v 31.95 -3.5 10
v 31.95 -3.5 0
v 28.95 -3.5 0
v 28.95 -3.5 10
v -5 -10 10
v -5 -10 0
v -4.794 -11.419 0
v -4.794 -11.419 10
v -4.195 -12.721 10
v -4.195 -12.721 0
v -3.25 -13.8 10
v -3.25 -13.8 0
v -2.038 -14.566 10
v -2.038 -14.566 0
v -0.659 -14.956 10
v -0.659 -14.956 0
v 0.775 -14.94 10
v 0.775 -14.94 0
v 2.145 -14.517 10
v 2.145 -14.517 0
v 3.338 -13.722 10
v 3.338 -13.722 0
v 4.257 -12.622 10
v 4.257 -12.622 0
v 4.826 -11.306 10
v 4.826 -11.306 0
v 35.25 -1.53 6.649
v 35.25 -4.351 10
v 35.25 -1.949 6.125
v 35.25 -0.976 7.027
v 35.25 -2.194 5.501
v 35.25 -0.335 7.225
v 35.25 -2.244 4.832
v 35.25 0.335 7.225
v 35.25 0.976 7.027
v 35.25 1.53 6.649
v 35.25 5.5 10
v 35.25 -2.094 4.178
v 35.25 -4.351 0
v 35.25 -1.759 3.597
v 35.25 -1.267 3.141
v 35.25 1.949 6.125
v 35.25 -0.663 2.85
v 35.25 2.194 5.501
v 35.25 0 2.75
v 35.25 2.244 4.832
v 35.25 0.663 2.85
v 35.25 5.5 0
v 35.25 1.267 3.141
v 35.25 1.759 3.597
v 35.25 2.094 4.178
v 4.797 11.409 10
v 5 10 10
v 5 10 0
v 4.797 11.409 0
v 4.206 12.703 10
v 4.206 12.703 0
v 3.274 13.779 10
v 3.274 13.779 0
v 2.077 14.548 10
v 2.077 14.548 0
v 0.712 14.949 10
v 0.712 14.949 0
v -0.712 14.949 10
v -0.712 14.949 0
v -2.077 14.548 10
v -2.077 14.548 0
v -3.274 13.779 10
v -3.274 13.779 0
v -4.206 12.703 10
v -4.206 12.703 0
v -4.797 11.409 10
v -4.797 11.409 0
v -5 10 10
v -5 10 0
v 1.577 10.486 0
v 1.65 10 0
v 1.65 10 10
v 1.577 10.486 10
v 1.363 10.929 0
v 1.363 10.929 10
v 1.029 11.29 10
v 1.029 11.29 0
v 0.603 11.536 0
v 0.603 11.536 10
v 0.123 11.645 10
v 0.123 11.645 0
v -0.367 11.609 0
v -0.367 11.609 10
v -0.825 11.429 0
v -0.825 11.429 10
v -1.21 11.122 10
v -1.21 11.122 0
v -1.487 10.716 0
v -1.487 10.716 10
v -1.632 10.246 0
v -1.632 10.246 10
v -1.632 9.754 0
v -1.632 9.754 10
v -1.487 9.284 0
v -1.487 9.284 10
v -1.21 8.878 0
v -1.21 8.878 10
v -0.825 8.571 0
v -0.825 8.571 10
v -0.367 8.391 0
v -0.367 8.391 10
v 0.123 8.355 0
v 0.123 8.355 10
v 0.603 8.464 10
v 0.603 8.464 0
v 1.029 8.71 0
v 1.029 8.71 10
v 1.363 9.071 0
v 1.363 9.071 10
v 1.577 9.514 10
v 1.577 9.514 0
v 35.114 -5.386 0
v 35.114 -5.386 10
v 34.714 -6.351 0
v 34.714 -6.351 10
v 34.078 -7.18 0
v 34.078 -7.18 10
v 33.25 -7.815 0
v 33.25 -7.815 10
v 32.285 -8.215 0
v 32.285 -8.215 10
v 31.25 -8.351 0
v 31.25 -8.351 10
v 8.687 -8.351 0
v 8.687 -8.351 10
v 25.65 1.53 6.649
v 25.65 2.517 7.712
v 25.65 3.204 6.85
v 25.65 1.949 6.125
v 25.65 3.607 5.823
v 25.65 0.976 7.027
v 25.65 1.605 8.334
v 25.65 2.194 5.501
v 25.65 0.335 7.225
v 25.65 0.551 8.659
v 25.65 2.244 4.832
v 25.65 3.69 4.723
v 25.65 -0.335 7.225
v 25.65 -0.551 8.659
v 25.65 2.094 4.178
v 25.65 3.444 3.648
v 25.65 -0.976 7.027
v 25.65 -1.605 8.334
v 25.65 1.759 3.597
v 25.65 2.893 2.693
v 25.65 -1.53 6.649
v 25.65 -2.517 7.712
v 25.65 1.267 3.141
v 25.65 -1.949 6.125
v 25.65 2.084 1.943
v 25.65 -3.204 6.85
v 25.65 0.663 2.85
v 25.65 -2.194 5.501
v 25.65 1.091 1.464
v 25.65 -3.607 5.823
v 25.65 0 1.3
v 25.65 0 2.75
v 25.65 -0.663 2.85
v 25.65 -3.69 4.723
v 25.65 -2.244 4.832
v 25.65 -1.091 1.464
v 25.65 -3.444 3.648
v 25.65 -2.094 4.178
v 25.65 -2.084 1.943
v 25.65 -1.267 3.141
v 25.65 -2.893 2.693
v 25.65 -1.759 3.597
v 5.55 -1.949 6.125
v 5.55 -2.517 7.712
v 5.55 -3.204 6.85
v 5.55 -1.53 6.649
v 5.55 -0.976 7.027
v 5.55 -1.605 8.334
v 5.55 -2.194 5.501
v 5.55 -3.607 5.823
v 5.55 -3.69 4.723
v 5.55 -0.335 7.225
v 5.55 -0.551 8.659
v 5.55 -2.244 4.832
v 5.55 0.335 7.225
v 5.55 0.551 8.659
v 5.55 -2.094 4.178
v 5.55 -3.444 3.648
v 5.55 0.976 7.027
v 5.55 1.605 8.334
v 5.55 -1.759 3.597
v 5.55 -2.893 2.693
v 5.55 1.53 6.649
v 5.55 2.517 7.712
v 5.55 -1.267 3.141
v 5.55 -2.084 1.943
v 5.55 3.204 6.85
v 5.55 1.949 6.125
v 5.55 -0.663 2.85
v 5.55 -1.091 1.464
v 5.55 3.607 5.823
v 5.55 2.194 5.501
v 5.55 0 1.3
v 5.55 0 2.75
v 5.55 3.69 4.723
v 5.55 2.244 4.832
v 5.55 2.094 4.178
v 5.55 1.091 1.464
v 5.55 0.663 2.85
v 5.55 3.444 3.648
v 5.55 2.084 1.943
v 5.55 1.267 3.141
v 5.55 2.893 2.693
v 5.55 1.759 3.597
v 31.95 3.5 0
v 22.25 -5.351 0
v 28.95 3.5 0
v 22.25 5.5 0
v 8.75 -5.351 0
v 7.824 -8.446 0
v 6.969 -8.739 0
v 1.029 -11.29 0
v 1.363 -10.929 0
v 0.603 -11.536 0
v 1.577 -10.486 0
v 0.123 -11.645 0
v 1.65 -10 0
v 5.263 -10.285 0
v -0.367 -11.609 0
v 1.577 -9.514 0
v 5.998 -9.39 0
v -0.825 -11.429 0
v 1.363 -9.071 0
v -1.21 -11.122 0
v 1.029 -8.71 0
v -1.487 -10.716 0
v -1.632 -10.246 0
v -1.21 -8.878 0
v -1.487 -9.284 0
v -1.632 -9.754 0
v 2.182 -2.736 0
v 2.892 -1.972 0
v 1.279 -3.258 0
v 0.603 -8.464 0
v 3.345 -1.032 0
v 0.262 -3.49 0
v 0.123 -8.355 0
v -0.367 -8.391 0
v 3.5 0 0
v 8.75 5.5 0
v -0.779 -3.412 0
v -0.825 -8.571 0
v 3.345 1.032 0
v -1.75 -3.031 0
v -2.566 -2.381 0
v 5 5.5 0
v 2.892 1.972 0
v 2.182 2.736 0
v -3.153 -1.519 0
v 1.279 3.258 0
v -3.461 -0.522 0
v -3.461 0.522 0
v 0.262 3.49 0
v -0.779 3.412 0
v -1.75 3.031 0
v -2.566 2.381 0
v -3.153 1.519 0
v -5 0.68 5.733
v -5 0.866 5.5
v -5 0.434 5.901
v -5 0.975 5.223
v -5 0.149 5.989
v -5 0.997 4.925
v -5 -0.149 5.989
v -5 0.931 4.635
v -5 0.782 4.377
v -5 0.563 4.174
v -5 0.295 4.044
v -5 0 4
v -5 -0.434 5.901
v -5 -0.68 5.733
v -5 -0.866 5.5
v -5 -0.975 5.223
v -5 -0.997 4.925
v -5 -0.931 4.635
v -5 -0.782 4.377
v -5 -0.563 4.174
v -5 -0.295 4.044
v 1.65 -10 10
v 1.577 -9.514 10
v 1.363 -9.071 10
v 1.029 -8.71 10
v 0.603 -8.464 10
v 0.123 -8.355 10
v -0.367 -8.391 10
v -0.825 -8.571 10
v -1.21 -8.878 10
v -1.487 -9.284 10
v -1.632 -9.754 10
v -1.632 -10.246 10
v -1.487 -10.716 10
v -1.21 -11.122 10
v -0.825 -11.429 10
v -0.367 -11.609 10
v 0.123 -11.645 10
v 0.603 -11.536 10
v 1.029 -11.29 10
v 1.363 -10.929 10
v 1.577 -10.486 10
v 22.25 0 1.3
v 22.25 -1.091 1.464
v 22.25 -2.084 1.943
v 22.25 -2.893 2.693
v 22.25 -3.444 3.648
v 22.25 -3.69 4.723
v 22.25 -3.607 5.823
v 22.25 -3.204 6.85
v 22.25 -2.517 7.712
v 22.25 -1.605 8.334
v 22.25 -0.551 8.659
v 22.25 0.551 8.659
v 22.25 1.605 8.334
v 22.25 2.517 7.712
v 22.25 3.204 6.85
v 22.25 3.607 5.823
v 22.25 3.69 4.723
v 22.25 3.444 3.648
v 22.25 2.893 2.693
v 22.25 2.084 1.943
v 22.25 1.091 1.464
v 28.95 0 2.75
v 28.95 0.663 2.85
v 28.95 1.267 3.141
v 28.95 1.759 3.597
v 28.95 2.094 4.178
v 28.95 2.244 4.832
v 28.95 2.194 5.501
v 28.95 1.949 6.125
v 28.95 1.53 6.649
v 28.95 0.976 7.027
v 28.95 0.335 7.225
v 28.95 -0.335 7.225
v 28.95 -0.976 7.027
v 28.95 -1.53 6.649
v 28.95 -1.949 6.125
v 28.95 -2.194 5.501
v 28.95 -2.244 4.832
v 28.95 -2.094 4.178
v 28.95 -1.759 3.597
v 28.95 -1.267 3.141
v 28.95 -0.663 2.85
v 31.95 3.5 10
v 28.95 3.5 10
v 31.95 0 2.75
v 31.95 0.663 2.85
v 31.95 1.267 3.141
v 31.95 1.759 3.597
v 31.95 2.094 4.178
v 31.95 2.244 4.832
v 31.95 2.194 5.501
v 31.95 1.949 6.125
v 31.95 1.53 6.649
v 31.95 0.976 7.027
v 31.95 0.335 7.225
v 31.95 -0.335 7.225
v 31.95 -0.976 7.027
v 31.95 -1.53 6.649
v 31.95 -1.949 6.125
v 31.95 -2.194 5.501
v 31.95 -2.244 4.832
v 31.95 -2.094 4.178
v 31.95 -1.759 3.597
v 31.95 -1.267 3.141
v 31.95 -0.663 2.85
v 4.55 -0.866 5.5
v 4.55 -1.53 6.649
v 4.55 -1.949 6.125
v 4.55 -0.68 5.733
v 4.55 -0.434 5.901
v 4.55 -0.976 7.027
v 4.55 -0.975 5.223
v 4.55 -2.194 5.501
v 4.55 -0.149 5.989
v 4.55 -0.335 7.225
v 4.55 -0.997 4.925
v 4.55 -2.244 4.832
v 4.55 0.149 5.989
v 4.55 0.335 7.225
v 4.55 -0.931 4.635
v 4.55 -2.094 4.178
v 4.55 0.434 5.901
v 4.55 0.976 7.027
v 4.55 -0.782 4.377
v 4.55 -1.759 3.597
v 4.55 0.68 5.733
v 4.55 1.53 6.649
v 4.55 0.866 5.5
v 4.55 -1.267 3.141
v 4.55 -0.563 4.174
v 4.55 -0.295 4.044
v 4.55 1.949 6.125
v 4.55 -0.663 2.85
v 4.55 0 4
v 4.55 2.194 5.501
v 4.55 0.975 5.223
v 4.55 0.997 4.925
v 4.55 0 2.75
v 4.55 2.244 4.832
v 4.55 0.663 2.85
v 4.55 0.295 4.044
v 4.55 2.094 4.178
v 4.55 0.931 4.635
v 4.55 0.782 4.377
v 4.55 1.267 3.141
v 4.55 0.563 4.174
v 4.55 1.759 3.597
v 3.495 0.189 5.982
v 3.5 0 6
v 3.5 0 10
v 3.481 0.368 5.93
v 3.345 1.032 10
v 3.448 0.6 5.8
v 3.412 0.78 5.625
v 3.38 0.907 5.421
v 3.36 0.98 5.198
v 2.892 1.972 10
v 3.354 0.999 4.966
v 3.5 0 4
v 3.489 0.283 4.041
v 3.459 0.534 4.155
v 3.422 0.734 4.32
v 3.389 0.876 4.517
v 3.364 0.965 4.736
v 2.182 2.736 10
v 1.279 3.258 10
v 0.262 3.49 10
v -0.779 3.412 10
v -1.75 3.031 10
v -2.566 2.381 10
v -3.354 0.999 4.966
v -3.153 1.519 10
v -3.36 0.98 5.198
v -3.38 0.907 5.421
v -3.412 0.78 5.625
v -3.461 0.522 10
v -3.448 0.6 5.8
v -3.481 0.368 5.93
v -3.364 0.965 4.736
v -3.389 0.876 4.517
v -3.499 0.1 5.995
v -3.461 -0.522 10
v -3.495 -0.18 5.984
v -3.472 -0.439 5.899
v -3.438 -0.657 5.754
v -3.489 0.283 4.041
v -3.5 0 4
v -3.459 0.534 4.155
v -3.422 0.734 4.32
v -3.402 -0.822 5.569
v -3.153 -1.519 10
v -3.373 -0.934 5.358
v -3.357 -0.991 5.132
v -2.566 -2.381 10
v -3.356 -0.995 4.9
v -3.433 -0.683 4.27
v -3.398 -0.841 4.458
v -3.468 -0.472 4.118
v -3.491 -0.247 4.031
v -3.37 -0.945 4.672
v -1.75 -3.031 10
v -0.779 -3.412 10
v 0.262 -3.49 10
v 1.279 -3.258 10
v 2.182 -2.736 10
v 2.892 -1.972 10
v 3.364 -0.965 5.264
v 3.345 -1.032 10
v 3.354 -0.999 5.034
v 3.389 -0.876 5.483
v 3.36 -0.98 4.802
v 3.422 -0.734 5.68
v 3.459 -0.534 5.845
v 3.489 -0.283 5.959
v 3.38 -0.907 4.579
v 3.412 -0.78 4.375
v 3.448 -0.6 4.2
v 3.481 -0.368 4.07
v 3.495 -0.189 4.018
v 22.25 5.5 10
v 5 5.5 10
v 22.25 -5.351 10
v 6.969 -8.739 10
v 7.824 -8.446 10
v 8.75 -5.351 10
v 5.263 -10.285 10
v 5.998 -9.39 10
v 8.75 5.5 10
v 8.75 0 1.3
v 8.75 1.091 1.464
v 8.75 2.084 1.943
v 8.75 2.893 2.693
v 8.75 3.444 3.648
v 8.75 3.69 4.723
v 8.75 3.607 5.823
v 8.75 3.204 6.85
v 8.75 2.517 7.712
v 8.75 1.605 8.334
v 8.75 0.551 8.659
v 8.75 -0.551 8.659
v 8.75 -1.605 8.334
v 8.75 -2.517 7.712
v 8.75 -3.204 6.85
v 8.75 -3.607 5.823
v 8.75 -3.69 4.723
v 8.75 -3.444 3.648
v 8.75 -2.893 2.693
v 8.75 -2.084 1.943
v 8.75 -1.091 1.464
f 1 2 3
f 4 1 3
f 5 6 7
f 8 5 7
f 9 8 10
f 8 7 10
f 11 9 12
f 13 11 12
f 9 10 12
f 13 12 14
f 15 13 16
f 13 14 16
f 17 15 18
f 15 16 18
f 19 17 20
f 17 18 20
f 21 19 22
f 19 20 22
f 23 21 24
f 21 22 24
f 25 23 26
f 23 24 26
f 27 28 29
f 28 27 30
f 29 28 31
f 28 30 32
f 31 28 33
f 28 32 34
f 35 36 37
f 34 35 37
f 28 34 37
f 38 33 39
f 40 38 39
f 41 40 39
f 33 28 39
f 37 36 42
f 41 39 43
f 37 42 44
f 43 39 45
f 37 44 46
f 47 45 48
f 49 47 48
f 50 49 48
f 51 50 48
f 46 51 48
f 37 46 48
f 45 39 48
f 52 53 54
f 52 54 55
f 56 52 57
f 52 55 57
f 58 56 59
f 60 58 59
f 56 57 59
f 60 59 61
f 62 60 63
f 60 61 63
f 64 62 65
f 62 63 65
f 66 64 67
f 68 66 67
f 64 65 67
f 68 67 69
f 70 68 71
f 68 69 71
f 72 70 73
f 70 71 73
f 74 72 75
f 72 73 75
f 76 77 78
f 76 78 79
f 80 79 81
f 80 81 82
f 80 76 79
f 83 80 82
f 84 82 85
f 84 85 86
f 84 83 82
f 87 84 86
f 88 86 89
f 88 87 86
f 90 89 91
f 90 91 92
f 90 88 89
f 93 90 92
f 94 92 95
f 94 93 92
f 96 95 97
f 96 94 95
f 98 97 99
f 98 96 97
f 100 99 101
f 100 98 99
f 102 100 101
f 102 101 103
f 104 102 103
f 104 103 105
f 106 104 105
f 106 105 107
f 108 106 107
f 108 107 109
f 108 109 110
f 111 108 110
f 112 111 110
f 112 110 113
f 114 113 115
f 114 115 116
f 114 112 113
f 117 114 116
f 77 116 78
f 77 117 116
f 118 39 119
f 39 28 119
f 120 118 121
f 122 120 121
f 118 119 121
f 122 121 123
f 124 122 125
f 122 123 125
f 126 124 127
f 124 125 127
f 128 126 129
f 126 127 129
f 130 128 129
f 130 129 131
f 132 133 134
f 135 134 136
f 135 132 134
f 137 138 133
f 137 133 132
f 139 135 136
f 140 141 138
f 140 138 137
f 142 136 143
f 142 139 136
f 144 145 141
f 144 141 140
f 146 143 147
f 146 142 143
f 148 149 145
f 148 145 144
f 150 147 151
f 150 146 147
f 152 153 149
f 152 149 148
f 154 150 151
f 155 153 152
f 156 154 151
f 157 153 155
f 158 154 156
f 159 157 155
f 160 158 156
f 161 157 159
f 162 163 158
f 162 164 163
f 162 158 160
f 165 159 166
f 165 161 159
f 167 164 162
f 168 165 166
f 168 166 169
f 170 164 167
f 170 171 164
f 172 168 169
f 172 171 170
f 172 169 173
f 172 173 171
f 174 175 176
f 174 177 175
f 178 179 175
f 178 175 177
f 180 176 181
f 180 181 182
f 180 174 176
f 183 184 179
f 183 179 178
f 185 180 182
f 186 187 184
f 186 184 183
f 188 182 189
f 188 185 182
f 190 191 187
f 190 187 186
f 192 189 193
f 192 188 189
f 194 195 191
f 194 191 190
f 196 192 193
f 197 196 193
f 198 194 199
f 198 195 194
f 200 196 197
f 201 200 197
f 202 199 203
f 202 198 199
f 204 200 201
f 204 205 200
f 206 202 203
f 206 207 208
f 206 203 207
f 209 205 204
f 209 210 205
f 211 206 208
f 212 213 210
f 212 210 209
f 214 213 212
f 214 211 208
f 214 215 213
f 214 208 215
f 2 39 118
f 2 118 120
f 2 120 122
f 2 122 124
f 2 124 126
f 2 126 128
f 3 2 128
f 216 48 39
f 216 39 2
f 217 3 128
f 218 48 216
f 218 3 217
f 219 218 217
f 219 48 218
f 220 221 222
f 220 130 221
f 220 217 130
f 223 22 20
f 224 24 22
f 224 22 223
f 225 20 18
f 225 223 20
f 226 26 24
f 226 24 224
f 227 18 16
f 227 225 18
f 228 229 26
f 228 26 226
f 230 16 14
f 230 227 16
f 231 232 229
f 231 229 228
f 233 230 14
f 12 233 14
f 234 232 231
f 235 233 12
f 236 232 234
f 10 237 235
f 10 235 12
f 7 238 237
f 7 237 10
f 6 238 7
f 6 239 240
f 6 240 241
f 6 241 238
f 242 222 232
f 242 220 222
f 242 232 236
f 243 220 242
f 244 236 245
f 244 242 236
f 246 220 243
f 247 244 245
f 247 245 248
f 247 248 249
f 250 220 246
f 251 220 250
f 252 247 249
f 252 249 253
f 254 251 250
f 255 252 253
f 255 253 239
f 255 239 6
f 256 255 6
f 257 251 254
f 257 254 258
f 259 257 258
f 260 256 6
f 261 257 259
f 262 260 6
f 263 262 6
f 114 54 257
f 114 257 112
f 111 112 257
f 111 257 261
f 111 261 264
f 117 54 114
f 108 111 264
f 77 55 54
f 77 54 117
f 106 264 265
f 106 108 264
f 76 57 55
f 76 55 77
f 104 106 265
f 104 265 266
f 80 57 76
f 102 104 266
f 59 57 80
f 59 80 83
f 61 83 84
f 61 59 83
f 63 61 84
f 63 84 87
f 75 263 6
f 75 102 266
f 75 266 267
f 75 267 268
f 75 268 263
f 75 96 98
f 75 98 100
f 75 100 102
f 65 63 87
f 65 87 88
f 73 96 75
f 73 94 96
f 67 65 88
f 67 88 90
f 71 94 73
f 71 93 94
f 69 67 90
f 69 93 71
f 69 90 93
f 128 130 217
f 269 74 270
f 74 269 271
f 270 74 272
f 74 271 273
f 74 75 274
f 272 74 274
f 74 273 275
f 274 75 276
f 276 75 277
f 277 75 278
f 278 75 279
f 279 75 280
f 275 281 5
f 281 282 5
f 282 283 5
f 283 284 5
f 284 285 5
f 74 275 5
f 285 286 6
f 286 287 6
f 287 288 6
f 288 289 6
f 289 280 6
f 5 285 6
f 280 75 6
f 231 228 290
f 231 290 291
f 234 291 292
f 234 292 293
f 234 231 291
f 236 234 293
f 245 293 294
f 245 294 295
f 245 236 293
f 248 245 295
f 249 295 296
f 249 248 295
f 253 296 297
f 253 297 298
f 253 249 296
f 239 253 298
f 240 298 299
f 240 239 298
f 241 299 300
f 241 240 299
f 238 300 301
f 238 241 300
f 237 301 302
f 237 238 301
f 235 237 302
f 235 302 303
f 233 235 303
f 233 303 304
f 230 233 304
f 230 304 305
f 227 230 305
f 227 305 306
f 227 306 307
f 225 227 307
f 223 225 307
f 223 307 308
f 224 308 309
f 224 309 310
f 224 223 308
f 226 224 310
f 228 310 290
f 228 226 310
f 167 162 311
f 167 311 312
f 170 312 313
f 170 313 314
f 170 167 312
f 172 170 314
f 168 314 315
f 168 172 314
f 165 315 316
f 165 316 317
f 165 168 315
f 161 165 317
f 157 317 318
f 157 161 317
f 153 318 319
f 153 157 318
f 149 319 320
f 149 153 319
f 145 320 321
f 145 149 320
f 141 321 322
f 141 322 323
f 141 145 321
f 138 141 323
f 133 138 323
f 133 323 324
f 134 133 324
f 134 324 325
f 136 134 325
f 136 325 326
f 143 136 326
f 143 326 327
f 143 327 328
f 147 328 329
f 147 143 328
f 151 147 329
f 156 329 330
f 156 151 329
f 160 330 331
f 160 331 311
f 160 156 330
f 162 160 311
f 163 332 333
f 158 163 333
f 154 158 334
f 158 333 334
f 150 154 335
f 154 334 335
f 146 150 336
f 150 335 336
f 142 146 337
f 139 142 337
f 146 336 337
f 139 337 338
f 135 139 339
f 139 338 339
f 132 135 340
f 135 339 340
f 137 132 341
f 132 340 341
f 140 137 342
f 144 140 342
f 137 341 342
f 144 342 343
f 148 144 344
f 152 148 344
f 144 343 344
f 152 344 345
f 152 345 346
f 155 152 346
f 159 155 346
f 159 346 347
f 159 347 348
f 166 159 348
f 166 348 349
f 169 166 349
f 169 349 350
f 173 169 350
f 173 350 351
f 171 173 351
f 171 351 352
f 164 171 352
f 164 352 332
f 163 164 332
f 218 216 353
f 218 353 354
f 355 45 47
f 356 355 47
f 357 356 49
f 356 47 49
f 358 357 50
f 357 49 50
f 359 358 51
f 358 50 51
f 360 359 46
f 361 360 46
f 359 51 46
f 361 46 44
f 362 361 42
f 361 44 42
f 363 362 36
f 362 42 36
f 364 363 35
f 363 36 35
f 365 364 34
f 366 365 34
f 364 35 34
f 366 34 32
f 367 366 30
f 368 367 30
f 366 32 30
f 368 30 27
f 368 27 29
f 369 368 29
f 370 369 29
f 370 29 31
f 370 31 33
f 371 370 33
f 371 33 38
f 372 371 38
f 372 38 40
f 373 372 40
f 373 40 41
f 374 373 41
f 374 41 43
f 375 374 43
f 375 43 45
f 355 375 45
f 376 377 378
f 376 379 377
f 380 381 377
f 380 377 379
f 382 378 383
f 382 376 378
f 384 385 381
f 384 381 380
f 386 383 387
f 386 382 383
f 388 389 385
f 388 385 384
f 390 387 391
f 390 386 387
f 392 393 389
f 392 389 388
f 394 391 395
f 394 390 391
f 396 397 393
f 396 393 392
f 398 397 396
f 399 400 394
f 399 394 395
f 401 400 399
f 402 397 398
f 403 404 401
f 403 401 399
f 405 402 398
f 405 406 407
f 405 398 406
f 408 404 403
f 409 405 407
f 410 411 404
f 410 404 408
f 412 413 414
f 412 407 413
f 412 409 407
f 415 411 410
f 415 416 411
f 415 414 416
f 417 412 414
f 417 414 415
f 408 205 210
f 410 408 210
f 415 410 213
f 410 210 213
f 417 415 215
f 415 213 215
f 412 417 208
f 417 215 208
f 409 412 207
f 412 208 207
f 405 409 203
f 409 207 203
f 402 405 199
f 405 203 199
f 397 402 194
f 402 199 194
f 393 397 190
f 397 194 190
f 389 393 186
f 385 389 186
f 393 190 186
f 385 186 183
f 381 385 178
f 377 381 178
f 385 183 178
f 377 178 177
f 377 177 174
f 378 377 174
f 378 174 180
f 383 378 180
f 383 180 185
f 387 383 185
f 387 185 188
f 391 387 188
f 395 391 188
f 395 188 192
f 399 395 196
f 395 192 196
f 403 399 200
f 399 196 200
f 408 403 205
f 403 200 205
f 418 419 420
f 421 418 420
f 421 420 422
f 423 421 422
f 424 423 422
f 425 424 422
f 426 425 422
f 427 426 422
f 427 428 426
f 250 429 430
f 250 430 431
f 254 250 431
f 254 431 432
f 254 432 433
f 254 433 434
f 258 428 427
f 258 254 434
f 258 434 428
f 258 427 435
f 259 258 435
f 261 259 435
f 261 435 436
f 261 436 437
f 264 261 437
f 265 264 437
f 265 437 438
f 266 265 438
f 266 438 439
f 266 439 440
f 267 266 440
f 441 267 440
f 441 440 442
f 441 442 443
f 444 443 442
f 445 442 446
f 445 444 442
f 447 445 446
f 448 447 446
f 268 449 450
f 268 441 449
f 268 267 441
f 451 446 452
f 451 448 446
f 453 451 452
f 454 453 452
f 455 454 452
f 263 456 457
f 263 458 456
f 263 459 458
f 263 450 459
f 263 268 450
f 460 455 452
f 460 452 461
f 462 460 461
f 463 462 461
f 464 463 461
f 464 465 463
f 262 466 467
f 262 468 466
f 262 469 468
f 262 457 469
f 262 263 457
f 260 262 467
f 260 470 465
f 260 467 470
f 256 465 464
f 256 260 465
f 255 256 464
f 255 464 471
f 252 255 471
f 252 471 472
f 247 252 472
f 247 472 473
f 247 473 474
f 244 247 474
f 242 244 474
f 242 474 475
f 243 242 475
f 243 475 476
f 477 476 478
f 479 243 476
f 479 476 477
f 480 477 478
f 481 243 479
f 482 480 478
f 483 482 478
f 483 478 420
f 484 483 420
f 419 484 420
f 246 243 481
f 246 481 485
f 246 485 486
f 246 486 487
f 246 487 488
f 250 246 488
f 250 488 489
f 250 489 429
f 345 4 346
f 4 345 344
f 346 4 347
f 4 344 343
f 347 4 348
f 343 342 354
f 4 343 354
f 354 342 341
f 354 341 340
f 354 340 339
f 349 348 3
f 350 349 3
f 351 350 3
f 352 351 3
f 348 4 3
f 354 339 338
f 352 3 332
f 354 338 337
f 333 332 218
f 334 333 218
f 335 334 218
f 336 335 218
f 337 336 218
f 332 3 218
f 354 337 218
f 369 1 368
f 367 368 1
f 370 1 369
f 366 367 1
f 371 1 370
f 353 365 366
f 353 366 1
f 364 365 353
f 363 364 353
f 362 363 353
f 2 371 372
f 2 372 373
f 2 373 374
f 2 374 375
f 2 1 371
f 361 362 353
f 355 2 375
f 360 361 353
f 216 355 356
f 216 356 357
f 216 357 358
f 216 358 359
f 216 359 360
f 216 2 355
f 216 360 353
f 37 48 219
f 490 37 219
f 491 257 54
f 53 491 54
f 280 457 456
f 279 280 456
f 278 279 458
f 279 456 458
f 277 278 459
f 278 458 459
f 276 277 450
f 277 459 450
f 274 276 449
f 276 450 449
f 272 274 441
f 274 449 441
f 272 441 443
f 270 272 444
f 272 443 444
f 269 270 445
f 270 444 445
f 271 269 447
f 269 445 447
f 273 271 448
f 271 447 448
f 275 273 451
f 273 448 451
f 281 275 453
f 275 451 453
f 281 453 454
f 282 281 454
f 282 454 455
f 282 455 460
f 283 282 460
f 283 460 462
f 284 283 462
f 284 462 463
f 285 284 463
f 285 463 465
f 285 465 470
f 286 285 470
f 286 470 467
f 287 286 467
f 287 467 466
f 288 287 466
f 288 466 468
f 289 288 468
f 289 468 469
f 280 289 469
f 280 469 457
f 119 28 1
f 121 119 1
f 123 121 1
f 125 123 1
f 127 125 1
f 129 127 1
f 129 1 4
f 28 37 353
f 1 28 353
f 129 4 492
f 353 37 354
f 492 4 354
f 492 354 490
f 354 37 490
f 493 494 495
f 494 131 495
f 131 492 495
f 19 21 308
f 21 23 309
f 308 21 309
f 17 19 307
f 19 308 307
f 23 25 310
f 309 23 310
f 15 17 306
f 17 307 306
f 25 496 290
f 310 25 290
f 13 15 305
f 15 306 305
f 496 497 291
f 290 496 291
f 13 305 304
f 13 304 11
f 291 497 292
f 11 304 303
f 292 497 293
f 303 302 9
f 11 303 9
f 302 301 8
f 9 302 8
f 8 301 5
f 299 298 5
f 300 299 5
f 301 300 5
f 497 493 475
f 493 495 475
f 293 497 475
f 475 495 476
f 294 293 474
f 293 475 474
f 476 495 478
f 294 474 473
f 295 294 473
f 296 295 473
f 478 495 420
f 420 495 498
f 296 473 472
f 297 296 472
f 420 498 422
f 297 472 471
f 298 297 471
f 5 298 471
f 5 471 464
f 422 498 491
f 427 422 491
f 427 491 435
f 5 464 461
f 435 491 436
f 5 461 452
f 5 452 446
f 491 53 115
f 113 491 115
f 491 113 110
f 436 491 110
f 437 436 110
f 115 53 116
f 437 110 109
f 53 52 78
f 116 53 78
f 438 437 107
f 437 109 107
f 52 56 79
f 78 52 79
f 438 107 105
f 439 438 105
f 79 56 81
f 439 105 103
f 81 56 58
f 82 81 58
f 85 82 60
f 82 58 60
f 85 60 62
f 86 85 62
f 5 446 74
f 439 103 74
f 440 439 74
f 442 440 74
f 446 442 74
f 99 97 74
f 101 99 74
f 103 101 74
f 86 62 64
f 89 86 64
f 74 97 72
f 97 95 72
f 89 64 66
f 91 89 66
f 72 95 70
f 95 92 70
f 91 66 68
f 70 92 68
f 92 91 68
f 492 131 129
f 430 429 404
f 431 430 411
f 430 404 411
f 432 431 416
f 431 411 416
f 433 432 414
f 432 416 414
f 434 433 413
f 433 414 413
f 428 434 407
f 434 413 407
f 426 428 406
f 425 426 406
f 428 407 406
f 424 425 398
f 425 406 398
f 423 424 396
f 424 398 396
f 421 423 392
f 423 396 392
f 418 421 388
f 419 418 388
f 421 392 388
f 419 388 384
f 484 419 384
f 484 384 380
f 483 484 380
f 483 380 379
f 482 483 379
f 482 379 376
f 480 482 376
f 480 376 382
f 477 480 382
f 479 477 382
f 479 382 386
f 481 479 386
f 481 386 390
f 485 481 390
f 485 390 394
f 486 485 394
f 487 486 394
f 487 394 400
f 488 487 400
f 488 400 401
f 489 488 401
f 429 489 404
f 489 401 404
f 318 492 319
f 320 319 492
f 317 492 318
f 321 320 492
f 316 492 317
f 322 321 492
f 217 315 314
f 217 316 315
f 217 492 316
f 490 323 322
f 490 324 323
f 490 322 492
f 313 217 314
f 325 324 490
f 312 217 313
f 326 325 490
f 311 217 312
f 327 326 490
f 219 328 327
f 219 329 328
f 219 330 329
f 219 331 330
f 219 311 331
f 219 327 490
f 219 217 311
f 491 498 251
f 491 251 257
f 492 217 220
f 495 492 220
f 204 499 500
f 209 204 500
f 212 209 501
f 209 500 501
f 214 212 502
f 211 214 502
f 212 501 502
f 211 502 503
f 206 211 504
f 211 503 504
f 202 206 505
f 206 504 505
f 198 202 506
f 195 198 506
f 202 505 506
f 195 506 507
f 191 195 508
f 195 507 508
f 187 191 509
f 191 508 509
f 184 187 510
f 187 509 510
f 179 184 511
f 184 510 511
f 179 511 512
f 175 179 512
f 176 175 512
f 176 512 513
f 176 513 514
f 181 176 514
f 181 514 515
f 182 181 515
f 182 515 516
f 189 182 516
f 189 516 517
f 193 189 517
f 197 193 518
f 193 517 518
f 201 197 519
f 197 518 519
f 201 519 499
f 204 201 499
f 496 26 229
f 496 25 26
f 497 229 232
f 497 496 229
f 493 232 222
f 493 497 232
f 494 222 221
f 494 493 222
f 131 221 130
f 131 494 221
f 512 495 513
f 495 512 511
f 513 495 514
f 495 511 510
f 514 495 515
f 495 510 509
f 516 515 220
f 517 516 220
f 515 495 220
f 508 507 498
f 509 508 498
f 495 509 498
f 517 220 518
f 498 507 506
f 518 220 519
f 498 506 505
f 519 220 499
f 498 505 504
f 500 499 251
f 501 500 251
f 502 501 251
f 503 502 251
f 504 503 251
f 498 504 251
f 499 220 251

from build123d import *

# Parameters (mm, degrees)
ESQUISSE1_R          = 1.65
ESQUISSE1_R_2        = 3.5
SHAPE_DEPTH          = 10
ESQUISSE6_W          = 10
ESQUISSE6_H          = 15
MAINSHAPE_DEPTH      = 30.25
ESQUISSE10_W         = 13.5
ESQUISSE10_H         = 12.85118471
SPACEREMOVER_DEPTH   = 13
ESQUISSE11_R         = 2.25
AXE_DEPTH            = 16
ESQUISSE12_R         = 3.7
BEARINGBOTTOM_DEPTH  = 3.2
BEARINGTOP_START     = -3.4
ESQUISSE14_R         = 3.7
BEARINGTOP_DEPTH     = 3.4
ESQUISSE15_R         = 2.25
AXEEND_DEPTH         = 1
ESQUISSE16_W         = 3
ESQUISSE16_H         = 7
AXELOCKER_DEPTH      = 10
ESQUISSE17_W         = 30.25
ESQUISSE17_H         = 0.85118471
RENFORCMENT_DEPTH    = 10
ESQUISSE18_W         = 30.25
ESQUISSE18_H         = 2
MASSREMOVER_DEPTH    = 10
CONG_1_R             = 4
ESQUISSE19_R         = 1
REMOVER_HELPER_DEPTH = 10


with BuildPart() as part:
    # Esquisse1 → Shape (new body)
    with BuildSketch(Plane.XY):
        with BuildLine():
            ThreePointArc((5, 10), (0, 15), (-5, 10))
            Line((-5, 10), (-5, -10))
            ThreePointArc((-5, -10), (0, -15), (5, -10))
            Line((5, -10), (5, 10))
        make_face()
        with Locations((0, 10)):
            Circle(ESQUISSE1_R, mode=Mode.SUBTRACT)
        Circle(ESQUISSE1_R_2, mode=Mode.SUBTRACT)
        with Locations((0, -10)):
            Circle(ESQUISSE1_R, mode=Mode.SUBTRACT)
    extrude(amount=SHAPE_DEPTH)

    # Esquisse6 → MainShape (add)
    with BuildSketch(Plane(origin=(5, 0, 0), x_dir=(0, 0, -1), z_dir=(1, 0, 0))):
        with Locations((-5, 0)):
            Rectangle(ESQUISSE6_W, ESQUISSE6_H)
    extrude(amount=MAINSHAPE_DEPTH)

    # Esquisse10 → SpaceRemover (cut)
    with BuildSketch(Plane(origin=(0, 0, 0), x_dir=(-1, 0, 0), z_dir=(0, 0, -1))):
        with Locations((-15.5, 1.074407645)):
            Rectangle(ESQUISSE10_W, ESQUISSE10_H)
    extrude(amount=-SPACEREMOVER_DEPTH, mode=Mode.SUBTRACT)

    # Esquisse11 → Axe (cut)
    with BuildSketch(Plane(origin=(35.25, 0, 0), x_dir=(0, 0, -1), z_dir=(1, 0, 0))):
        with Locations((-5, 0)):
            Circle(ESQUISSE11_R)
    extrude(amount=-AXE_DEPTH, mode=Mode.SUBTRACT)

    # Esquisse12 → BearingBottom (cut)
    with BuildSketch(Plane(origin=(8.75, 0, 0), x_dir=(0, 0, -1), z_dir=(1, 0, 0))):
        with Locations((-5, 0)):
            Circle(ESQUISSE12_R)
    extrude(amount=-BEARINGBOTTOM_DEPTH, mode=Mode.SUBTRACT)

    # Esquisse14 → BearingTop (cut)
    with BuildSketch(Plane.ZY.offset(-22.25).offset(BEARINGTOP_START)):
        with Locations(Location((5, 0, 0), (0, 0, 180))):
            Circle(ESQUISSE14_R)
    extrude(amount=BEARINGTOP_DEPTH, mode=Mode.SUBTRACT)

    # Esquisse15 → AxeEnd (cut)
    with BuildSketch(Plane(origin=(5.55, 0, 0), x_dir=(0, 0, -1), z_dir=(1, 0, 0))):
        with Locations((-5, 0)):
            Circle(ESQUISSE15_R)
    extrude(amount=-AXEEND_DEPTH, mode=Mode.SUBTRACT)

    # Esquisse16 → AxeLocker (cut)
    with BuildSketch(Plane(origin=(0, 0, 0), x_dir=(-1, 0, 0), z_dir=(0, 0, -1))):
        with Locations((-30.45, 0)):
            Rectangle(ESQUISSE16_W, ESQUISSE16_H)
    extrude(amount=-AXELOCKER_DEPTH, mode=Mode.SUBTRACT)

    # Esquisse17 → Renforcment (add)
    with BuildSketch(Plane(origin=(0, 0, 0), x_dir=(-1, 0, 0), z_dir=(0, 0, -1))):
        with Locations((-20.125, -7.925592355)):
            Rectangle(ESQUISSE17_W, ESQUISSE17_H)
    extrude(amount=-RENFORCMENT_DEPTH)

    # Esquisse18 → MassRemover (cut)
    with BuildSketch(Plane(origin=(0, 0, 0), x_dir=(-1, 0, 0), z_dir=(0, 0, -1))):
        with Locations((-20.125, 6.5)):
            Rectangle(ESQUISSE18_W, ESQUISSE18_H)
    extrude(amount=-MASSREMOVER_DEPTH, mode=Mode.SUBTRACT)

    # Congé1
    cong_1_edges = [part.edges().sort_by_distance(p)[0] for p in [
        (35.25, -8.35118471, 5),
        (5, -8.35118471, 5),
    ]]
    fillet(cong_1_edges, radius=CONG_1_R)

    # Esquisse19 → Remover helper (cut)
    with BuildSketch(Plane(origin=(4.55, 0, 0), x_dir=(0, 0, -1), z_dir=(1, 0, 0))):
        with Locations((-5, 0)):
            Circle(ESQUISSE19_R)
    extrude(amount=-REMOVER_HELPER_DEPTH, mode=Mode.SUBTRACT)


solid = part.part
